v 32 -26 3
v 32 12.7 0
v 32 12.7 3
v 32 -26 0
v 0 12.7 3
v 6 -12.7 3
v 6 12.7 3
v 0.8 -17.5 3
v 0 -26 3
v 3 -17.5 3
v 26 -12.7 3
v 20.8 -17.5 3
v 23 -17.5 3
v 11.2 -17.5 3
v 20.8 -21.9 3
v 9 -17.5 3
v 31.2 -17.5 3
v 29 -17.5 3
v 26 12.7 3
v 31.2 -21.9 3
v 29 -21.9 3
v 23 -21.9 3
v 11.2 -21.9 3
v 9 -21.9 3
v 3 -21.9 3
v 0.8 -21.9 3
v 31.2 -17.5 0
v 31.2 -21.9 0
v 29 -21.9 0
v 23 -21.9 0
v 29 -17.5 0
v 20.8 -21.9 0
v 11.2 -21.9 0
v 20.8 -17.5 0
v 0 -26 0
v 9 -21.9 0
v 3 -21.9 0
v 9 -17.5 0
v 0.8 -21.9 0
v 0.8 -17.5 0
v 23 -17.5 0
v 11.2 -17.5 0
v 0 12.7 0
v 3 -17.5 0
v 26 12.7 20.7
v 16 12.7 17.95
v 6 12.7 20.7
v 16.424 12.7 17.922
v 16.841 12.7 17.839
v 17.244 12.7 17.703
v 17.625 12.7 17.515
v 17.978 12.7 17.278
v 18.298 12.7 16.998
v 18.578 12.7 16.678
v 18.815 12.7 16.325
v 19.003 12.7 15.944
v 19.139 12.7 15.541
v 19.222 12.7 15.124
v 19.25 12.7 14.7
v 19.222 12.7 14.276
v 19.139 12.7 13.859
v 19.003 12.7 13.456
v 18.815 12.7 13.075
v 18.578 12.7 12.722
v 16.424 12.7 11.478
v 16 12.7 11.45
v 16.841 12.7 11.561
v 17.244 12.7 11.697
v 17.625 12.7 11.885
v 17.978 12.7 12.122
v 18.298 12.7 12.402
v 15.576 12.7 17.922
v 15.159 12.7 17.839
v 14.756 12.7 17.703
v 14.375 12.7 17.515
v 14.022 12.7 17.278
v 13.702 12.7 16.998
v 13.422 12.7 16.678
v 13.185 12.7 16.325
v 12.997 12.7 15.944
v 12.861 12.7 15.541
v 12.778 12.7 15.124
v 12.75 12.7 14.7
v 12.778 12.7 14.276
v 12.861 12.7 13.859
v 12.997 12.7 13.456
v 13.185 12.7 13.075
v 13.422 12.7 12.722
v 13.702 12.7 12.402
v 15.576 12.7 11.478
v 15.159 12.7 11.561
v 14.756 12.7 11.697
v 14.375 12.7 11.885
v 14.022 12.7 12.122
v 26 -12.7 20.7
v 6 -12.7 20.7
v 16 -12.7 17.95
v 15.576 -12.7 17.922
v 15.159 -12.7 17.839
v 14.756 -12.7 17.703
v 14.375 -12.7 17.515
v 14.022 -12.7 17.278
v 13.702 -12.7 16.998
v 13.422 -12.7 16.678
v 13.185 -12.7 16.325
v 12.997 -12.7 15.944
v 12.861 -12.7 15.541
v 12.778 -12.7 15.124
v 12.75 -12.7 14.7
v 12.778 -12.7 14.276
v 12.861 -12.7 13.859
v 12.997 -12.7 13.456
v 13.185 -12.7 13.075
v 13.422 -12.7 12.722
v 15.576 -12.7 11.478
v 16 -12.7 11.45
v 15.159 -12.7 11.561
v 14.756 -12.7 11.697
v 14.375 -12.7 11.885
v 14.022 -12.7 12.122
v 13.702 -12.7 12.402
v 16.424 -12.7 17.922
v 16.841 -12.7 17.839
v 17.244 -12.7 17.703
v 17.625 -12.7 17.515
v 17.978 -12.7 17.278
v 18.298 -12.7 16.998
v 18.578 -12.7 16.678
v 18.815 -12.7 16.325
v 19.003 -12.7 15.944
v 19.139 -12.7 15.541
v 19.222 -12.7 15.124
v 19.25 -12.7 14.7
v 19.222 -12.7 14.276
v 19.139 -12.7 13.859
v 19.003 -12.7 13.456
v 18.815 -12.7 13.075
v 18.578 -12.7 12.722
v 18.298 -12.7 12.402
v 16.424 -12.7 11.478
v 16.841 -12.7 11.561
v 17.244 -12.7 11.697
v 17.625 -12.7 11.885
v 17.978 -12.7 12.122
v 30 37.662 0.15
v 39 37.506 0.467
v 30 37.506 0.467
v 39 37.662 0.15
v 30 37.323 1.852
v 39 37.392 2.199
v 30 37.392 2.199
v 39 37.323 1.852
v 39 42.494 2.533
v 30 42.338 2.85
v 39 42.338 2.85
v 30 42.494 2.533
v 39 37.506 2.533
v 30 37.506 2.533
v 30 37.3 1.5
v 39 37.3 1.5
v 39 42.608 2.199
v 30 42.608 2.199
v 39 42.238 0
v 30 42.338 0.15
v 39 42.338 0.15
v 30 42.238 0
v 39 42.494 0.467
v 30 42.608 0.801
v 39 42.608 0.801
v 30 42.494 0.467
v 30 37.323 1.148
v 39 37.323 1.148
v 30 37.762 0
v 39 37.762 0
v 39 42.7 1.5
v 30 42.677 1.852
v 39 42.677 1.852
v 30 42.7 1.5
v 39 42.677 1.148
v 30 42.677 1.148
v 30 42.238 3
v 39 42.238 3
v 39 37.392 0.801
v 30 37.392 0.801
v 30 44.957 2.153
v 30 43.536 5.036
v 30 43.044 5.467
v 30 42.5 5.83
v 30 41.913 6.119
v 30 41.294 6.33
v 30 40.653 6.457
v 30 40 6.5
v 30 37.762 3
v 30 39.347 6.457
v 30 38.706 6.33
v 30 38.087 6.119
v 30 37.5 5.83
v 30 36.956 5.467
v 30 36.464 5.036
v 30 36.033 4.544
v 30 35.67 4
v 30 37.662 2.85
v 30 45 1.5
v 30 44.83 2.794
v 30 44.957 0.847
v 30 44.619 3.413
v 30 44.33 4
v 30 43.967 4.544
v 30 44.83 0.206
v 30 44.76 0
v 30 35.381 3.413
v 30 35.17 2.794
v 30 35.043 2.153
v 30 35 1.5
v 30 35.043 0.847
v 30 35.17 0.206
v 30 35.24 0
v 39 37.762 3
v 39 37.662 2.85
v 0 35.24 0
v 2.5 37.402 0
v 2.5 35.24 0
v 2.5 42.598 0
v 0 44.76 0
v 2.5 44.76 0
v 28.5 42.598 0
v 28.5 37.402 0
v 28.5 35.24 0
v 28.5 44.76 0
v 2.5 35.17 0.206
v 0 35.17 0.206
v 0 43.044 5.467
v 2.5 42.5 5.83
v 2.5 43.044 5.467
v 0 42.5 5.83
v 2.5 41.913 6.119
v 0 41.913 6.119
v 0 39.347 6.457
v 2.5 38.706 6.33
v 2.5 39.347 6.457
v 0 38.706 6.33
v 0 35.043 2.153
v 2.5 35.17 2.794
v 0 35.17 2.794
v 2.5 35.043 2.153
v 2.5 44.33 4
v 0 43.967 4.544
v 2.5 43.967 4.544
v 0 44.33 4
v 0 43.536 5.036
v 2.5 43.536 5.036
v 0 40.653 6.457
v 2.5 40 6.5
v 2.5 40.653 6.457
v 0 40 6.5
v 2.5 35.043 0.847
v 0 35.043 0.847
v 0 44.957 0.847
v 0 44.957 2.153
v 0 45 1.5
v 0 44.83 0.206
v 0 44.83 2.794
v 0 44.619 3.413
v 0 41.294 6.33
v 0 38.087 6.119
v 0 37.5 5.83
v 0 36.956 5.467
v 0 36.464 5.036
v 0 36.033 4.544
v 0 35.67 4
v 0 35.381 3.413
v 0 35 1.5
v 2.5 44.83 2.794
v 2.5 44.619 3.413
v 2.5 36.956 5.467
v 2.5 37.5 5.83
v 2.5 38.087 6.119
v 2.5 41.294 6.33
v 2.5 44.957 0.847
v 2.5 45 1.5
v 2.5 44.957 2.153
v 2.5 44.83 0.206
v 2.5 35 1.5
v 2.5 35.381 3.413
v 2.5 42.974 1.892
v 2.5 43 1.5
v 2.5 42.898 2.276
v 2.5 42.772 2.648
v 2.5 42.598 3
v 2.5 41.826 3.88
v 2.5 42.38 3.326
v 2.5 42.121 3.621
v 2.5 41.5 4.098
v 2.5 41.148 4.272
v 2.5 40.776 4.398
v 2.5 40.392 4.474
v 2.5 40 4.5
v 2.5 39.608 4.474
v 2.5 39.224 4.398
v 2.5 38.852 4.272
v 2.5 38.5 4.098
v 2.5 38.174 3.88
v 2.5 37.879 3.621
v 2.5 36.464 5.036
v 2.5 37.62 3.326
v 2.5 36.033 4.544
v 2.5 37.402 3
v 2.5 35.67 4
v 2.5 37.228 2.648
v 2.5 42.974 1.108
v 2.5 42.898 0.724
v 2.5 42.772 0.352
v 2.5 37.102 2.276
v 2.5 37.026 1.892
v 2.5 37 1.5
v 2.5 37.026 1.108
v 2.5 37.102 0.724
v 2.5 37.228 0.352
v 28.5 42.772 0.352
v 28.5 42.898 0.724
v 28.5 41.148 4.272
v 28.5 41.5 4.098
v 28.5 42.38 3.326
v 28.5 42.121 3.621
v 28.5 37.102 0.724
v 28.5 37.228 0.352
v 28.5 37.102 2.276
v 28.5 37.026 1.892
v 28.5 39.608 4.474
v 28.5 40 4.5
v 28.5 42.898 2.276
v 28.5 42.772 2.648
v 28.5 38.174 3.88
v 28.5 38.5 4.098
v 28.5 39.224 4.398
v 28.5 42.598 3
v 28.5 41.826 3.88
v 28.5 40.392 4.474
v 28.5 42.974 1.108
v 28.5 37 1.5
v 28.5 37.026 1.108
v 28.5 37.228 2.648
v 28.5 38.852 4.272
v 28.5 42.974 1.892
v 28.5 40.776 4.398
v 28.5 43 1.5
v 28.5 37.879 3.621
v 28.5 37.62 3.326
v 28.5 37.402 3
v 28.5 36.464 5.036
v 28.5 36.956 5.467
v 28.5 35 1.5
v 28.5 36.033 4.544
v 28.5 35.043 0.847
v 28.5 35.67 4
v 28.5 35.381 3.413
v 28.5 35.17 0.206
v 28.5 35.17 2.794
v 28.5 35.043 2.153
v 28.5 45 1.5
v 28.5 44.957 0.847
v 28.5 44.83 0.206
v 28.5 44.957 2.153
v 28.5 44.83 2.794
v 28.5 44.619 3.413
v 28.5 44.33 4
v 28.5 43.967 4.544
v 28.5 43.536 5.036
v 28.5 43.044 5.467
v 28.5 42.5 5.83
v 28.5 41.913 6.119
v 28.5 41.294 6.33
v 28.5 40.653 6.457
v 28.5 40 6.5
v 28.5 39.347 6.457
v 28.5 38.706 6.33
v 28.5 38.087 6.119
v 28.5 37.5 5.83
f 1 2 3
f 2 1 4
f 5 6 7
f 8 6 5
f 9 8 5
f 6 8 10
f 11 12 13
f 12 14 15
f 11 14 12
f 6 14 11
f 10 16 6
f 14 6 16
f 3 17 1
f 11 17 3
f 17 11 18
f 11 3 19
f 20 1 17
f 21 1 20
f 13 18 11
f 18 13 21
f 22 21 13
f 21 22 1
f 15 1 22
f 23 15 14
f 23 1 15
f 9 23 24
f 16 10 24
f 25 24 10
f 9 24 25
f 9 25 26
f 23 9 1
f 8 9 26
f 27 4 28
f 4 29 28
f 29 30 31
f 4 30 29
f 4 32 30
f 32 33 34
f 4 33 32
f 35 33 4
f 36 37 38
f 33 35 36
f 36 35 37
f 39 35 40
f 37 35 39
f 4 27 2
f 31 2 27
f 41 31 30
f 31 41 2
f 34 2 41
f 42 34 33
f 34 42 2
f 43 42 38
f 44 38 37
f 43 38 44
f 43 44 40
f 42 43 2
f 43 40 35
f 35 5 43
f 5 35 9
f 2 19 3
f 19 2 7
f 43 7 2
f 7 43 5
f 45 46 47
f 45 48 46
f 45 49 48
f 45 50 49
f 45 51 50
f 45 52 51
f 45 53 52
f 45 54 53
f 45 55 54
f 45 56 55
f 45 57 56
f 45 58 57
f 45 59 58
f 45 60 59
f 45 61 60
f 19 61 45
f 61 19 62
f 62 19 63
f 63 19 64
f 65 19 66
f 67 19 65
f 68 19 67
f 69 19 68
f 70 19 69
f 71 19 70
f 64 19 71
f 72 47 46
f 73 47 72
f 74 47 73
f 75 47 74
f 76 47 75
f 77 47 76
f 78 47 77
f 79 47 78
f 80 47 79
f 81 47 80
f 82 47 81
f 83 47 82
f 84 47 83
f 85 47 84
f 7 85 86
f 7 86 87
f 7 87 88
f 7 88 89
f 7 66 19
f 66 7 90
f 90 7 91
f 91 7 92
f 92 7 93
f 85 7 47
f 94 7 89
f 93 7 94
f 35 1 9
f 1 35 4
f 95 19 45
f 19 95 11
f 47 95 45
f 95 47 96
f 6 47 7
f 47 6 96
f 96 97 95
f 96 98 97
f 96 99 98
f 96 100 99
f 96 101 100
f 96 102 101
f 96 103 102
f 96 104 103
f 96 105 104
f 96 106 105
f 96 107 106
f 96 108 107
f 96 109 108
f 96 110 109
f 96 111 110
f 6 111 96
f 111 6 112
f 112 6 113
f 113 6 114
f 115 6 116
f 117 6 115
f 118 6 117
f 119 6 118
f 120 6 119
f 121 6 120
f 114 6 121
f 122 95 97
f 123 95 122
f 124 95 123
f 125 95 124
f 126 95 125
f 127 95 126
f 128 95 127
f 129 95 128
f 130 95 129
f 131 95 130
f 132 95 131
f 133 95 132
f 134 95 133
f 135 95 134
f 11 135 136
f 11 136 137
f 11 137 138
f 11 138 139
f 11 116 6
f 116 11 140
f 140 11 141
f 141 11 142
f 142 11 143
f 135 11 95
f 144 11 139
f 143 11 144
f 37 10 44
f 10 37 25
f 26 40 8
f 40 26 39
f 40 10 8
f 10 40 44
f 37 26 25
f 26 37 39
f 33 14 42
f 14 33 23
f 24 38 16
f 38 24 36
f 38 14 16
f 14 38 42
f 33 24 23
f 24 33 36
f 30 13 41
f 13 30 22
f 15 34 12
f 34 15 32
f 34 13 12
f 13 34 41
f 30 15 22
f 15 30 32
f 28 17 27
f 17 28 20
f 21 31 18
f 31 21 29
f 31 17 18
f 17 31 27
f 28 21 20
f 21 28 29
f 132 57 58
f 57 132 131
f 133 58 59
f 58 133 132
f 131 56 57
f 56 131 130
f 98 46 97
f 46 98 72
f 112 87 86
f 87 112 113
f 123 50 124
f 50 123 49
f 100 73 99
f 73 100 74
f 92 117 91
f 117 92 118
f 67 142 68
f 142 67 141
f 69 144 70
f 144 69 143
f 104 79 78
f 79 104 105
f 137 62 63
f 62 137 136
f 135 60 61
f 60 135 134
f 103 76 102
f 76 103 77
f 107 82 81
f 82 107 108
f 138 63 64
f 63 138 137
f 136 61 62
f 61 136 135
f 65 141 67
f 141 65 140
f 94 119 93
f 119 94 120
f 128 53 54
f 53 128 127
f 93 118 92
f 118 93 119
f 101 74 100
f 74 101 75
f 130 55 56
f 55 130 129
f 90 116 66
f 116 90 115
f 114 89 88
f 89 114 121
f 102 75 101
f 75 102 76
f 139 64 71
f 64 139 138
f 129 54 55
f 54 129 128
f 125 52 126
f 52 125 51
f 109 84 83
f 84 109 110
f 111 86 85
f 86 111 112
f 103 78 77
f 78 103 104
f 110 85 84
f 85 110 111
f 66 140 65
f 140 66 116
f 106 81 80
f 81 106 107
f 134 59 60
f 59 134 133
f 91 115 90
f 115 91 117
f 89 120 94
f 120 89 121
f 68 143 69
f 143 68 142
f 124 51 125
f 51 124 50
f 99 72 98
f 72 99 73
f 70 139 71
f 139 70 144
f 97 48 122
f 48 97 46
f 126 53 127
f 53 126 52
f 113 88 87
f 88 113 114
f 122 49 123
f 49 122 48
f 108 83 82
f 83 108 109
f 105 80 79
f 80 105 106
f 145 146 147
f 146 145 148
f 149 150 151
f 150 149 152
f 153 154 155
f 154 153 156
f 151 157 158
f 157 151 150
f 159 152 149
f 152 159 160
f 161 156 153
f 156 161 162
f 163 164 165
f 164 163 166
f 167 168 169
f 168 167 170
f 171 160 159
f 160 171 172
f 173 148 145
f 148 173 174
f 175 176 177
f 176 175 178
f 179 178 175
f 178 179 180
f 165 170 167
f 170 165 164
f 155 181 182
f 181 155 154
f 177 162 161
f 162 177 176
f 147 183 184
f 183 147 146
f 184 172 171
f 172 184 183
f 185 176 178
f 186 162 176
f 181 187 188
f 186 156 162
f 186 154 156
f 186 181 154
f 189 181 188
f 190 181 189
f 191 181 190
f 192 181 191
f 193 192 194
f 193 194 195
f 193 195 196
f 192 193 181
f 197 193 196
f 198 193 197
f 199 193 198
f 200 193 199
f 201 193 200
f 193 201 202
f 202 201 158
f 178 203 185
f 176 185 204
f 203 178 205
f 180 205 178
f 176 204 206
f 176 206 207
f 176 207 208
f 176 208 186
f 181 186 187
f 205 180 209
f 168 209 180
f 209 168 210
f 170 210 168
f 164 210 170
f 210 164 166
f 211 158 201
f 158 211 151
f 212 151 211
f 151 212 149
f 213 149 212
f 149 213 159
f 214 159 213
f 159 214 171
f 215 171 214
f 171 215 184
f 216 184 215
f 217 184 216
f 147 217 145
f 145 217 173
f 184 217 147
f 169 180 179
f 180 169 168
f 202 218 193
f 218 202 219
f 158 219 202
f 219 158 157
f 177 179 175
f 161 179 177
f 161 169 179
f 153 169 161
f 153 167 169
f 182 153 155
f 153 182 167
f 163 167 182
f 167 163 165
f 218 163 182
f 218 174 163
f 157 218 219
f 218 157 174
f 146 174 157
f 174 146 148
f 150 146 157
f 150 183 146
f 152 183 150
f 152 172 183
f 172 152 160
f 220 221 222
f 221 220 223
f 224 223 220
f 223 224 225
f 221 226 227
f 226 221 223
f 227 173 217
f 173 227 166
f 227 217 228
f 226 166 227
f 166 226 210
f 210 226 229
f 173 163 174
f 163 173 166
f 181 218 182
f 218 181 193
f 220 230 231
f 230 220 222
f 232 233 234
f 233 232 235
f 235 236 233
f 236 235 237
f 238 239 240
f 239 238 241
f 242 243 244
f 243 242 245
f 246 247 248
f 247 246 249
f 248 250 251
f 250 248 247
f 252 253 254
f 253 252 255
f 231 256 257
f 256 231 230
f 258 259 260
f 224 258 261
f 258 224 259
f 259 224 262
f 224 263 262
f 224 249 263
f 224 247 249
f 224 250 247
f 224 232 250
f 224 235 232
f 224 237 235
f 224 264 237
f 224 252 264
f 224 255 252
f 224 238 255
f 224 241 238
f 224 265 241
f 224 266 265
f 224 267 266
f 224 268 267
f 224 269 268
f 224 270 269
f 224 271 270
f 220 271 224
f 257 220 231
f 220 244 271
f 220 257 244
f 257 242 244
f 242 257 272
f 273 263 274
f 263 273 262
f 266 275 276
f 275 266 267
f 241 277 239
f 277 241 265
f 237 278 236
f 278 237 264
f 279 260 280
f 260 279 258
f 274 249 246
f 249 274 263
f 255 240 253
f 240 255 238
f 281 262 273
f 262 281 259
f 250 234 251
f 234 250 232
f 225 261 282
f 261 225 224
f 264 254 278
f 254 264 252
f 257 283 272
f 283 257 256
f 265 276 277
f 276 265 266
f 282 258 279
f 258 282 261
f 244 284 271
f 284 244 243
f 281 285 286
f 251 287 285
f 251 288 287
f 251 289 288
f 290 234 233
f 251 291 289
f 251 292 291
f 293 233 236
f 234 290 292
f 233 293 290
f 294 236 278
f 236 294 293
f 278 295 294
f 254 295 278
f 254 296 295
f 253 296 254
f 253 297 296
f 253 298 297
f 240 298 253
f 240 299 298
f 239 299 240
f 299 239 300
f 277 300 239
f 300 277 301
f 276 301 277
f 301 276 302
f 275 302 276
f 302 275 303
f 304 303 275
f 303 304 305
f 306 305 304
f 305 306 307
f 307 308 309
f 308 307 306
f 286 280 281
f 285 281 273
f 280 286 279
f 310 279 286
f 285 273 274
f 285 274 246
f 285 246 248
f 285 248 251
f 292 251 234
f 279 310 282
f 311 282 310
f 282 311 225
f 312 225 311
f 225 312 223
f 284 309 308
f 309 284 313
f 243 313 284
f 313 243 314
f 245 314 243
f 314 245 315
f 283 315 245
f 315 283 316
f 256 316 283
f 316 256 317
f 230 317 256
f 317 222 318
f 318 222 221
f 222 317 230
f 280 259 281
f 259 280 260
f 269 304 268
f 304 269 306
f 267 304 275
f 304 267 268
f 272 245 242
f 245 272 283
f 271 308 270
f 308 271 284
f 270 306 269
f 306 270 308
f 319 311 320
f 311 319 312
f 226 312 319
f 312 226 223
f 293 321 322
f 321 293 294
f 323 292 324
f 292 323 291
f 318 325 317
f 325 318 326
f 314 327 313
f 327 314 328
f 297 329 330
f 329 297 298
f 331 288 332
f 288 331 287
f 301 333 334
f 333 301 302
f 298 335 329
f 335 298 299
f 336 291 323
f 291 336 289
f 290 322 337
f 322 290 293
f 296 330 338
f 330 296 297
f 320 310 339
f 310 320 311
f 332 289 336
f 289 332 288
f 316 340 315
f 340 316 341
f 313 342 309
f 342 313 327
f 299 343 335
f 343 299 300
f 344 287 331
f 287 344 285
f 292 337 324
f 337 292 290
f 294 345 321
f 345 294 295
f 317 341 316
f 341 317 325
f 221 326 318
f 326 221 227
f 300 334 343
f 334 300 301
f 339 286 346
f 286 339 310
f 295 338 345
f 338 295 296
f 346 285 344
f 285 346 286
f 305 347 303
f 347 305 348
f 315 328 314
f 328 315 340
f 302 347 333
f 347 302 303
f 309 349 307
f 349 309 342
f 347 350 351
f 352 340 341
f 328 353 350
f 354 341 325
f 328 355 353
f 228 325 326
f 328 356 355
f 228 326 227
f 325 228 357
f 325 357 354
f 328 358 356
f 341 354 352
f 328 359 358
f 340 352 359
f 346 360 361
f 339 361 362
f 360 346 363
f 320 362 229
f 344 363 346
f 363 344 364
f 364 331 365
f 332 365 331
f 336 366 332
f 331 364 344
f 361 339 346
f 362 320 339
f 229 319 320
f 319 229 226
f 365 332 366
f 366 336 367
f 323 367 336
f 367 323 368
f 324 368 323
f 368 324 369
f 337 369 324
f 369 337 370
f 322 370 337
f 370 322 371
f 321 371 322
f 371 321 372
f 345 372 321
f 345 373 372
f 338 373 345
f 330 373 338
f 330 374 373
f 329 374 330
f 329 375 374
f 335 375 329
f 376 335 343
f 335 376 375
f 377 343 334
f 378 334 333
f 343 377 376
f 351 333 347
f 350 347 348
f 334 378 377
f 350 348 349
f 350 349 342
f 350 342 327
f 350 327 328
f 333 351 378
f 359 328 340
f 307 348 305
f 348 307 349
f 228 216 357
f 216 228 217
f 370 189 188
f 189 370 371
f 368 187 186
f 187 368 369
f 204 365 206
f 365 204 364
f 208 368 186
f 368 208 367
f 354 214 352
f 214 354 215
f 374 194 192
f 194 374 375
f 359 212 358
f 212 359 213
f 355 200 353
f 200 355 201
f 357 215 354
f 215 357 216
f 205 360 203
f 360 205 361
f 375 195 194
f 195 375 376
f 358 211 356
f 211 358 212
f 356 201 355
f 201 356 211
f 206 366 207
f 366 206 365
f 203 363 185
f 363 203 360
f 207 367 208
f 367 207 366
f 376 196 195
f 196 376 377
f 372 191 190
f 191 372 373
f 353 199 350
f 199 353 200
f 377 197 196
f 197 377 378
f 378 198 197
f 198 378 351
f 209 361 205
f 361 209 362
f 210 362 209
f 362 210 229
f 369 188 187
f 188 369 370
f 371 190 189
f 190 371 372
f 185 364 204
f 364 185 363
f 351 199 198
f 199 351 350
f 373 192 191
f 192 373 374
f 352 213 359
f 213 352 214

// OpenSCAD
// ======================================================================
//  ВІЛЬНЕ КОЛЕСО: ТРИМАЧ + ВІСЬ · sosny · BEST EC Day 2 (TD)
//
//  Для жовтих коліс Ø66 × 30 мм без мотора. Тримач має ТАКУ САМУ полицю
//  і прорізи під стяжки, як motor_holder.scad (крок ламелей 20 мм),
//  а отвір осі — на тій самій висоті, що вал TT-мотора, тож усі 4 колеса
//  стоять рівно. Деталі симетричні — підходять на будь-який бік.
//  Друкувати: 2 × holder, 2 × axle.
//
//  Вісь: головка всередині → крізь тримач → шайба → D-кінець у маточину
//  колеса. Колесо сидить на D-кінці, вісь крутиться в отворі тримача.
//
//  Друк: PLA 0.28, 3 стінки, 30 %, без підтримок.
//  Тримач — полицею на стіл. Вісь — лежачи на плоскій грані (так міцніша).
// ======================================================================

part = "both";   // "holder", "axle" або "both"

// --- маточина колеса (D-отвір як на валу TT) ---
hub_d    = 5.4;    // круглий діаметр D-кінця
hub_flat = 3.0;    // між лисками (заміряно 3 мм; у типового TT — 3.7)
hub_len  = 9;      // скільки заходить у маточину

// --- вісь ---
ax_d     = 6;      // діаметр частини, що крутиться в тримачі
head_d   = 10;     // головка (не дає осі вийти назовні)
head_t   = 2.5;
washer_d = 10;     // шайба між тримачем і колесом
washer_t = 1.5;
play     = 0.6;    // осьовий люфт

// --- тримач (полиця = як у motor_holder.scad) ---
len_x    = 32;
flange_t = 3;
flange_in = 26;    // як у motor_holder: полиця тільки всередину рами
slot_l   = 4.4;
slot_w   = 2.2;
slat_pitch = 20;
slat_w   = 5;
block_x  = 20;     // довжина блоку вздовж руху
block_y  = 25.4;   // = ширина тунелю motor_holder: зовнішня грань врівень з краєм рами
axle_z   = 14.7;   // від рами до центру осі (= центр вала TT у motor_holder)
hole_fit = 0.5;    // зазор отвору (вісь має крутитись вільно)
below    = 6;      // матеріал під отвором

$fn = 48;

module holder() {
    out_y = 25.4;  // як тунель motor_holder — прорізи на тих самих місцях
    difference() {
        union() {
            translate([0, -flange_in, 0]) cube([len_x, flange_in + block_y/2, flange_t]);
            translate([(len_x - block_x)/2, -block_y/2, 0])
                cube([block_x, block_y, axle_z + below]);
        }
        // отвір осі (Ø6.5 горизонтально друкується без підтримок)
        translate([len_x/2, 0, axle_z]) rotate([90, 0, 0])
            cylinder(d = ax_d + hole_fit, h = block_y + 2, center = true);
        xc0 = (len_x - slat_pitch)/2;
        for (xc = [xc0, xc0 + slat_pitch], dx = [-1, 1])
            translate([xc + dx*(slat_w/2 + 0.5 + slot_w/2) - slot_w/2,
                       -(out_y/2 + 7) - slot_l/2, -1])
                cube([slot_w, slot_l, flange_t + 2]);
    }
}

module axle() {
    l_round = block_y + play + washer_t;
    // лежить уздовж X, плоска грань (z = −hub_flat/2) на столі
    translate([0, 0, hub_flat/2])
    intersection() {
        union() {
            rotate([0, 90, 0]) cylinder(d = head_d, h = head_t);
            translate([head_t, 0, 0]) rotate([0, 90, 0]) cylinder(d = ax_d, h = block_y + play);
            translate([head_t + block_y + play, 0, 0]) rotate([0, 90, 0]) cylinder(d = washer_d, h = washer_t);
            translate([head_t + l_round, 0, 0]) rotate([0, 90, 0])
                intersection() {   // D-кінець з двома лисками
                    cylinder(d = hub_d, h = hub_len);
                    translate([-hub_flat/2, -hub_d, 0]) cube([hub_flat, 2*hub_d, hub_len]);
                }
        }
        // зрізати все нижче лиски — плоска опора для друку
        translate([-1, -50, -hub_flat/2]) cube([100, 100, 100]);
    }
}

if (part == "holder" || part == "both") holder();
if (part == "axle"   || part == "both") translate([0, 40, 0]) axle();
